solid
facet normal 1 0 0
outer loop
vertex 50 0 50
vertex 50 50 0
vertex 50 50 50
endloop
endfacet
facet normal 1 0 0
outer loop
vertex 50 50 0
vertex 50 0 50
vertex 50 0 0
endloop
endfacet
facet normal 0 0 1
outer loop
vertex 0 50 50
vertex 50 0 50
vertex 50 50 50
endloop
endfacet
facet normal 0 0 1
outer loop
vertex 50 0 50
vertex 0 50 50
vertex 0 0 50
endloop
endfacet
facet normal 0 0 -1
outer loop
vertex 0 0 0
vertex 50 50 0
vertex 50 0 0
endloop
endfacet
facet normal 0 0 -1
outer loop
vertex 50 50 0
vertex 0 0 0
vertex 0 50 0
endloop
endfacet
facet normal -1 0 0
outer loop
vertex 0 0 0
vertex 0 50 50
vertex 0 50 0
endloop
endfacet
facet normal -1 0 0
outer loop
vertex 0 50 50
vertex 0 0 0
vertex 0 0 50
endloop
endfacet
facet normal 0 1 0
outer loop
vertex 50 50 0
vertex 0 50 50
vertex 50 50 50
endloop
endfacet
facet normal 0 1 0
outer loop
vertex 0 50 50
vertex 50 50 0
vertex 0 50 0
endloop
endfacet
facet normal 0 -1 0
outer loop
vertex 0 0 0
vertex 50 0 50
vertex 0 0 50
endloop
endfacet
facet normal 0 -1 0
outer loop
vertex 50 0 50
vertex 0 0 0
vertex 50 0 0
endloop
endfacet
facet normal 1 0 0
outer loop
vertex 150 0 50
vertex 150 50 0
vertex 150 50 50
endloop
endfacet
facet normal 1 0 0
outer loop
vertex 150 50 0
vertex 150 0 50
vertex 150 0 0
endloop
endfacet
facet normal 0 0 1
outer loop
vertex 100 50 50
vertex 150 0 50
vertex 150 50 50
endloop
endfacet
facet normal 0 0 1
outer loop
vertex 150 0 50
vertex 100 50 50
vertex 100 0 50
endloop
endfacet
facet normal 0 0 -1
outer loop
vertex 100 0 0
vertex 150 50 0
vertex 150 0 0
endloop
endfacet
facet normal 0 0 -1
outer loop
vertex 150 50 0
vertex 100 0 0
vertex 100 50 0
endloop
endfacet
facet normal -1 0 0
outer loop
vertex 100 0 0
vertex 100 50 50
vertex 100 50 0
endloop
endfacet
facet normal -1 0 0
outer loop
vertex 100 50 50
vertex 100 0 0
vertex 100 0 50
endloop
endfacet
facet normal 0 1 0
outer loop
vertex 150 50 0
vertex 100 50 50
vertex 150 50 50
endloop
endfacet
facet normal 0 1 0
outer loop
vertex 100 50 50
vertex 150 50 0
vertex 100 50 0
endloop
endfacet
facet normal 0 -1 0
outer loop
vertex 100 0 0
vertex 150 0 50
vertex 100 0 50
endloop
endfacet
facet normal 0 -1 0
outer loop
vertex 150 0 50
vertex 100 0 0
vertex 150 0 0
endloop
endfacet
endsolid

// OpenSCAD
echo($preview=$preview); // true when doing openCSG preview, false otherwise

if($preview)
    color("red") sphere(50);
else
    cube(50);
    
translate([100, 0]) render() {
    if($preview)
        color("red") sphere(50);
    else
        cube(50);
}
